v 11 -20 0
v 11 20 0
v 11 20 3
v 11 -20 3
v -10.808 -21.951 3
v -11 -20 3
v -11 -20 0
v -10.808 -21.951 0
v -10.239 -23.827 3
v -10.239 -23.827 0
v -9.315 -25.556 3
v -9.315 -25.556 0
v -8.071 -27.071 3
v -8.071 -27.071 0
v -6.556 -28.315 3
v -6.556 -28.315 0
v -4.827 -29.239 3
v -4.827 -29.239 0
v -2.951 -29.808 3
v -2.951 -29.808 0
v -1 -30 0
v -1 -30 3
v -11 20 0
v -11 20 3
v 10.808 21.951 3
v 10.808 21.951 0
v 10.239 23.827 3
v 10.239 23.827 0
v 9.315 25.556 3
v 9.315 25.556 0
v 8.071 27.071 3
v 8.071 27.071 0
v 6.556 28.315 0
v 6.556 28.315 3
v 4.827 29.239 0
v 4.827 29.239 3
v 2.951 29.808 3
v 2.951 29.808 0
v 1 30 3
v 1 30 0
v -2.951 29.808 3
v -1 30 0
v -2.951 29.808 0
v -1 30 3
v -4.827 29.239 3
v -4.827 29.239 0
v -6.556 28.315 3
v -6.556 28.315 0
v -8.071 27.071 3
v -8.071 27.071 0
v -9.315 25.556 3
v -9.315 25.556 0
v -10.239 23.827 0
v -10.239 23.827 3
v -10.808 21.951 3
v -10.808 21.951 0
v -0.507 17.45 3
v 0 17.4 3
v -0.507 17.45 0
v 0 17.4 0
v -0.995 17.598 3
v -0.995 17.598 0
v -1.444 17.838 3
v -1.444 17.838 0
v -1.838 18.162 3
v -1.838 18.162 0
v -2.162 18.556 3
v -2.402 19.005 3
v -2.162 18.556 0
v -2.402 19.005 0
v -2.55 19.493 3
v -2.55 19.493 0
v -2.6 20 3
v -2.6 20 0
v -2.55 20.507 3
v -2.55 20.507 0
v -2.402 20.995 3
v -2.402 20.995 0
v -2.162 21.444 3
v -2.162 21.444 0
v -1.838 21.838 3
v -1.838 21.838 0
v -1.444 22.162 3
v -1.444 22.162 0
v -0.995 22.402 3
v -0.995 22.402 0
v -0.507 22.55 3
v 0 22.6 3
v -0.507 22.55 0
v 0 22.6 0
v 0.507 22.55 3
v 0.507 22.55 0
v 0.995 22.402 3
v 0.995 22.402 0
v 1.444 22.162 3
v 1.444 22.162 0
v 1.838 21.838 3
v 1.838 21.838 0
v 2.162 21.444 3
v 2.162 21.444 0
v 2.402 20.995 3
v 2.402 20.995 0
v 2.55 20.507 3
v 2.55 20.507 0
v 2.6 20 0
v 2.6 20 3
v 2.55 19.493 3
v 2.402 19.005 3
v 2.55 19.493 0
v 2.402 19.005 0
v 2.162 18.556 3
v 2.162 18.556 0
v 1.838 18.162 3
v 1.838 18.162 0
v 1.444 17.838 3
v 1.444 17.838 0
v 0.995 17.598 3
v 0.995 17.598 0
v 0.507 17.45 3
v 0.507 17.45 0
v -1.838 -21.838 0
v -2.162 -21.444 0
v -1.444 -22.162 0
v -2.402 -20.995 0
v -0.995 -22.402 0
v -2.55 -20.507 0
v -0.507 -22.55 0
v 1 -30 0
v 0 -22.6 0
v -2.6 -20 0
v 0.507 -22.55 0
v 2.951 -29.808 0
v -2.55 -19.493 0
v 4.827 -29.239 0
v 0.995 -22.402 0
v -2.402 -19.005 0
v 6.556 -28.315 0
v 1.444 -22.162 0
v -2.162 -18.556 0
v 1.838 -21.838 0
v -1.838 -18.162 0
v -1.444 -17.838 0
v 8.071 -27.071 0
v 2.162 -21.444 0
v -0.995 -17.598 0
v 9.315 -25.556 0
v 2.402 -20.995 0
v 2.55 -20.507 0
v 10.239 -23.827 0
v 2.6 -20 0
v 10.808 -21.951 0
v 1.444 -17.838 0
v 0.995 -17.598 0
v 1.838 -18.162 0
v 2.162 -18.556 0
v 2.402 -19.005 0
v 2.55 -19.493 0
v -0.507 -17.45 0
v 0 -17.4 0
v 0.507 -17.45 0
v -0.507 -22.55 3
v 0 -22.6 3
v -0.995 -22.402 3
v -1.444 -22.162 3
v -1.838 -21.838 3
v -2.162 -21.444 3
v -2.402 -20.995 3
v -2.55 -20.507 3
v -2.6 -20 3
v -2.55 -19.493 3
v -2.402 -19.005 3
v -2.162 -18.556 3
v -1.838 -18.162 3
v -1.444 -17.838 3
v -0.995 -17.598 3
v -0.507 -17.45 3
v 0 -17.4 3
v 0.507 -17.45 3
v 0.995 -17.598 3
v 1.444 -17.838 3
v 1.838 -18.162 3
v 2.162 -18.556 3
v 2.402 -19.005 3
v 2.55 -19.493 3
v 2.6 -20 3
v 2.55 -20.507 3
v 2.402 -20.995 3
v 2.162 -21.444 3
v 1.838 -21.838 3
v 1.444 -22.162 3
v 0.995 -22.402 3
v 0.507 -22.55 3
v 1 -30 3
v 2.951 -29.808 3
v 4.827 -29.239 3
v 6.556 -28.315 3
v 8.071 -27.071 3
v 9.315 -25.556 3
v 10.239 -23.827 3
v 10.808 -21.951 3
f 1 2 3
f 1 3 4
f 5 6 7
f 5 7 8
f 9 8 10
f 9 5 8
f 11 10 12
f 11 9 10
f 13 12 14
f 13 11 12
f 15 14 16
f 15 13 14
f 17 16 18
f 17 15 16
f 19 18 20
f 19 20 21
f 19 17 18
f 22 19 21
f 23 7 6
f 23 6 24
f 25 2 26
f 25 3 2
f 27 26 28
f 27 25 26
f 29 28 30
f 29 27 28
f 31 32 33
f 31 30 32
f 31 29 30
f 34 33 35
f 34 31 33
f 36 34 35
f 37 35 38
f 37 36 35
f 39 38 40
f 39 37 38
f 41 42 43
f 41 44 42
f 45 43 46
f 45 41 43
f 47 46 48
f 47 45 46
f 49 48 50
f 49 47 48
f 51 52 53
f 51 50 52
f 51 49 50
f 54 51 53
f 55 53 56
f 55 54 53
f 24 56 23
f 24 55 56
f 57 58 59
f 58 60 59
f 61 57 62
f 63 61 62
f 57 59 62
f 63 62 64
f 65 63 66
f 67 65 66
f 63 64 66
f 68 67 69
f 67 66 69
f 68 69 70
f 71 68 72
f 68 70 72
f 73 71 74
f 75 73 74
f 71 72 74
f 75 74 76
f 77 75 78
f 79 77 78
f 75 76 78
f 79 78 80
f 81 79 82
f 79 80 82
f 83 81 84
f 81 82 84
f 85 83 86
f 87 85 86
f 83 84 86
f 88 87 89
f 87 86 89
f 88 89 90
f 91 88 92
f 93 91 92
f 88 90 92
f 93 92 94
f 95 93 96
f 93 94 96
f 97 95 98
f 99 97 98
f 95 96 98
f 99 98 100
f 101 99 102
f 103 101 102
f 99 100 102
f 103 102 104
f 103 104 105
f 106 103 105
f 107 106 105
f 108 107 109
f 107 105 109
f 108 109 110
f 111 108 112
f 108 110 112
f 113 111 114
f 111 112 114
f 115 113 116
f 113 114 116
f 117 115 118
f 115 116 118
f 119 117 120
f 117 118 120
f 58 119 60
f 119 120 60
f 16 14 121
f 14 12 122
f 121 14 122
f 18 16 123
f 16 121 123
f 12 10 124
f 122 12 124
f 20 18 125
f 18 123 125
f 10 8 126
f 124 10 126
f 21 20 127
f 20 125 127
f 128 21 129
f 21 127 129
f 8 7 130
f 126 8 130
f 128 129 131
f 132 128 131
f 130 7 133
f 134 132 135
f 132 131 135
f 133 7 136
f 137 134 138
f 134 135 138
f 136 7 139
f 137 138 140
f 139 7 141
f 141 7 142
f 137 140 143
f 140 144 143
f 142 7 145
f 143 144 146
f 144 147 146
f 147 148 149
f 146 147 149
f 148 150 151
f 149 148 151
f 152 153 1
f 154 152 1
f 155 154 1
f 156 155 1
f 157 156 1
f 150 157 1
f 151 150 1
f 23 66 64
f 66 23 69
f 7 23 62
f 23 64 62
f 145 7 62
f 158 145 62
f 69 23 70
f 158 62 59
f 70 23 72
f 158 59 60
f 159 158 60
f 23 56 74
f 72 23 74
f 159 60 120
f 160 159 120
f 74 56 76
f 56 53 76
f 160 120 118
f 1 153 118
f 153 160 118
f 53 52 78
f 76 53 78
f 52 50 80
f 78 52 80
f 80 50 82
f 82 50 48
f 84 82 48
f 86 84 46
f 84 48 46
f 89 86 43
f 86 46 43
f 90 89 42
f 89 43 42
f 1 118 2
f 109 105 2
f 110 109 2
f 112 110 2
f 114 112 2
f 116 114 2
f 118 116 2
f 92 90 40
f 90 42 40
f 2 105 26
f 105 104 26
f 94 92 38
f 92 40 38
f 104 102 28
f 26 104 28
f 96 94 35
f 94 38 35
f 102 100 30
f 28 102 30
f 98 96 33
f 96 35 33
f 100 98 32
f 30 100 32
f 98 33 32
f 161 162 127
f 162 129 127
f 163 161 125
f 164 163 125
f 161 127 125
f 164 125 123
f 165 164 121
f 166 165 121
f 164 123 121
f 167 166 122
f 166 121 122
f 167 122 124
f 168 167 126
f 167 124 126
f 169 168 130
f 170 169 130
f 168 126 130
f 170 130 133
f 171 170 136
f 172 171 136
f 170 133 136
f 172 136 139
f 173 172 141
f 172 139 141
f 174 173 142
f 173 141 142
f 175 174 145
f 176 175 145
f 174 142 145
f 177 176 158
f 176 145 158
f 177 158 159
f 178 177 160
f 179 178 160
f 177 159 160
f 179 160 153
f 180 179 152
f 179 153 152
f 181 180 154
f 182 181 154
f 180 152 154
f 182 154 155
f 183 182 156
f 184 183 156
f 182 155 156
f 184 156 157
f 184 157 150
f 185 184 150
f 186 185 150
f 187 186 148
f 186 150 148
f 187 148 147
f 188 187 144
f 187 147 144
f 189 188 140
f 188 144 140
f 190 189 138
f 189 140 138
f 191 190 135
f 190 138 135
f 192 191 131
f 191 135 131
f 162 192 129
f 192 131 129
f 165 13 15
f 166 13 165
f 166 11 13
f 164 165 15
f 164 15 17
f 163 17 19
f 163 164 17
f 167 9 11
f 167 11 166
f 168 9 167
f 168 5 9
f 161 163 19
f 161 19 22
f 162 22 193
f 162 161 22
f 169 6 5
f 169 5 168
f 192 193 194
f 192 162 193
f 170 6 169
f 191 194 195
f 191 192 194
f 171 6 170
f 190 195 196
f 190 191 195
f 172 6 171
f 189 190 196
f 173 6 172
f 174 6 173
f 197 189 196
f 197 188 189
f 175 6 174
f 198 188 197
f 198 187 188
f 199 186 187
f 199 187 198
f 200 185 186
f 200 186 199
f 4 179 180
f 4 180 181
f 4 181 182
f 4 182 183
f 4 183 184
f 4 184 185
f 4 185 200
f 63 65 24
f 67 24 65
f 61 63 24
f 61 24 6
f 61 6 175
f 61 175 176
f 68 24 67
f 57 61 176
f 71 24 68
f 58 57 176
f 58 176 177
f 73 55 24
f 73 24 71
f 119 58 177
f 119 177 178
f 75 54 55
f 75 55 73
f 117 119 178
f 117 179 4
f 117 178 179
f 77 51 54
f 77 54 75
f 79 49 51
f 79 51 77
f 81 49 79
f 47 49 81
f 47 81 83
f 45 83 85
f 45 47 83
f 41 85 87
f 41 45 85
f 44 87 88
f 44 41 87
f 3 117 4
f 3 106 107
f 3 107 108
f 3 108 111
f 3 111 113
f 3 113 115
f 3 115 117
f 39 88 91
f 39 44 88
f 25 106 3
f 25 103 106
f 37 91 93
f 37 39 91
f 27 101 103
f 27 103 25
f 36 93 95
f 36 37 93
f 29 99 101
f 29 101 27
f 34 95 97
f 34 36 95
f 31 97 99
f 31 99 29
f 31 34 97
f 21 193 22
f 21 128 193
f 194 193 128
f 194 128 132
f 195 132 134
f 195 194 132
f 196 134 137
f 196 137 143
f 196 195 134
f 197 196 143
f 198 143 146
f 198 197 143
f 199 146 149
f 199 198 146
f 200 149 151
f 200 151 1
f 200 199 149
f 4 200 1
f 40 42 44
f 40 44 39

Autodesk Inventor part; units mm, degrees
ref_plane "YZ Plane" through (0, 0, 0) normal (1, 0, 0) x (0, 1, 0)
ref_plane "XZ Plane" through (0, 0, 0) normal (0, 1, 0) x (-1, 0, 0)
ref_plane "XY Plane" through (0, 0, 0) normal (0, 0, 1) x (1, 0, 0)
sketch "Skizze1" plane through (0, 0, 0) normal (0, 0, 1) x (1, 0, 0)
  line L0 (-15.4, 0) -> (15.4, 0) projected
  line L1 (0, -42) -> (0, 42) projected
  line L2 (11, -30) -> (-11, -30)
  line L3 (-11, -30) -> (-11, 30)
  line L4 (-11, 30) -> (11, 30)
  line L5 (11, 30) -> (11, -30)
  line L6 (11, -30) -> (-11, 30) construction
  line L7 (-11, -30) -> (11, 30) construction
  point P0 (0, 0)
  dimension "d0" = 60
  dimension "d1" = 22
extrude "Extrusion1" add sketch "Skizze1" along normal blind 3
sketch "Skizze2" plane through (0, 0, 3) normal (0, 0, 1) x (1, 0, 0)
  line L0 (11, 30) -> (-11, 30) projected
  line L1 (-11, 30) -> (-11, -30) projected
  line L2 (-11, -30) -> (11, -30) projected
  line L3 (11, -30) -> (11, 30) projected
  line L4 (-17.5, 0) -> (17.5, 0) projected
  line L5 (0, -42) -> (0, 42) projected
  line L6 (3.1579, -20) -> (-3.1579, -20)
  line L7 (-3.1579, -20) -> (-3.1579, 20)
  line L8 (-3.1579, 20) -> (3.1579, 20)
  line L9 (3.1579, 20) -> (3.1579, -20)
  line L10 (3.1579, -20) -> (-3.1579, 20) construction
  line L11 (-3.1579, -20) -> (3.1579, 20) construction
  point P0 (0, 0)
  point P1 (0, 20)
  point P2 (0, -20)
  dimension "d4" = 40
hole "Bohrung1" at (0, 20, 3) at (0, -20, 3) direction (0, 0, -1) diameter 5.2 end through all
fillet "Rundung1" radius 10 4 edges at (-11, 30, 1.5) (11, 30, 1.5) (11, -30, 1.5) (-11, -30, 1.5)
sketch "Skizze3" plane through (0, 0, 3) normal (0, 0, 1) x (1, 0, 0)
  point P0 (0, 0)
properties part number "24_0497_005"
